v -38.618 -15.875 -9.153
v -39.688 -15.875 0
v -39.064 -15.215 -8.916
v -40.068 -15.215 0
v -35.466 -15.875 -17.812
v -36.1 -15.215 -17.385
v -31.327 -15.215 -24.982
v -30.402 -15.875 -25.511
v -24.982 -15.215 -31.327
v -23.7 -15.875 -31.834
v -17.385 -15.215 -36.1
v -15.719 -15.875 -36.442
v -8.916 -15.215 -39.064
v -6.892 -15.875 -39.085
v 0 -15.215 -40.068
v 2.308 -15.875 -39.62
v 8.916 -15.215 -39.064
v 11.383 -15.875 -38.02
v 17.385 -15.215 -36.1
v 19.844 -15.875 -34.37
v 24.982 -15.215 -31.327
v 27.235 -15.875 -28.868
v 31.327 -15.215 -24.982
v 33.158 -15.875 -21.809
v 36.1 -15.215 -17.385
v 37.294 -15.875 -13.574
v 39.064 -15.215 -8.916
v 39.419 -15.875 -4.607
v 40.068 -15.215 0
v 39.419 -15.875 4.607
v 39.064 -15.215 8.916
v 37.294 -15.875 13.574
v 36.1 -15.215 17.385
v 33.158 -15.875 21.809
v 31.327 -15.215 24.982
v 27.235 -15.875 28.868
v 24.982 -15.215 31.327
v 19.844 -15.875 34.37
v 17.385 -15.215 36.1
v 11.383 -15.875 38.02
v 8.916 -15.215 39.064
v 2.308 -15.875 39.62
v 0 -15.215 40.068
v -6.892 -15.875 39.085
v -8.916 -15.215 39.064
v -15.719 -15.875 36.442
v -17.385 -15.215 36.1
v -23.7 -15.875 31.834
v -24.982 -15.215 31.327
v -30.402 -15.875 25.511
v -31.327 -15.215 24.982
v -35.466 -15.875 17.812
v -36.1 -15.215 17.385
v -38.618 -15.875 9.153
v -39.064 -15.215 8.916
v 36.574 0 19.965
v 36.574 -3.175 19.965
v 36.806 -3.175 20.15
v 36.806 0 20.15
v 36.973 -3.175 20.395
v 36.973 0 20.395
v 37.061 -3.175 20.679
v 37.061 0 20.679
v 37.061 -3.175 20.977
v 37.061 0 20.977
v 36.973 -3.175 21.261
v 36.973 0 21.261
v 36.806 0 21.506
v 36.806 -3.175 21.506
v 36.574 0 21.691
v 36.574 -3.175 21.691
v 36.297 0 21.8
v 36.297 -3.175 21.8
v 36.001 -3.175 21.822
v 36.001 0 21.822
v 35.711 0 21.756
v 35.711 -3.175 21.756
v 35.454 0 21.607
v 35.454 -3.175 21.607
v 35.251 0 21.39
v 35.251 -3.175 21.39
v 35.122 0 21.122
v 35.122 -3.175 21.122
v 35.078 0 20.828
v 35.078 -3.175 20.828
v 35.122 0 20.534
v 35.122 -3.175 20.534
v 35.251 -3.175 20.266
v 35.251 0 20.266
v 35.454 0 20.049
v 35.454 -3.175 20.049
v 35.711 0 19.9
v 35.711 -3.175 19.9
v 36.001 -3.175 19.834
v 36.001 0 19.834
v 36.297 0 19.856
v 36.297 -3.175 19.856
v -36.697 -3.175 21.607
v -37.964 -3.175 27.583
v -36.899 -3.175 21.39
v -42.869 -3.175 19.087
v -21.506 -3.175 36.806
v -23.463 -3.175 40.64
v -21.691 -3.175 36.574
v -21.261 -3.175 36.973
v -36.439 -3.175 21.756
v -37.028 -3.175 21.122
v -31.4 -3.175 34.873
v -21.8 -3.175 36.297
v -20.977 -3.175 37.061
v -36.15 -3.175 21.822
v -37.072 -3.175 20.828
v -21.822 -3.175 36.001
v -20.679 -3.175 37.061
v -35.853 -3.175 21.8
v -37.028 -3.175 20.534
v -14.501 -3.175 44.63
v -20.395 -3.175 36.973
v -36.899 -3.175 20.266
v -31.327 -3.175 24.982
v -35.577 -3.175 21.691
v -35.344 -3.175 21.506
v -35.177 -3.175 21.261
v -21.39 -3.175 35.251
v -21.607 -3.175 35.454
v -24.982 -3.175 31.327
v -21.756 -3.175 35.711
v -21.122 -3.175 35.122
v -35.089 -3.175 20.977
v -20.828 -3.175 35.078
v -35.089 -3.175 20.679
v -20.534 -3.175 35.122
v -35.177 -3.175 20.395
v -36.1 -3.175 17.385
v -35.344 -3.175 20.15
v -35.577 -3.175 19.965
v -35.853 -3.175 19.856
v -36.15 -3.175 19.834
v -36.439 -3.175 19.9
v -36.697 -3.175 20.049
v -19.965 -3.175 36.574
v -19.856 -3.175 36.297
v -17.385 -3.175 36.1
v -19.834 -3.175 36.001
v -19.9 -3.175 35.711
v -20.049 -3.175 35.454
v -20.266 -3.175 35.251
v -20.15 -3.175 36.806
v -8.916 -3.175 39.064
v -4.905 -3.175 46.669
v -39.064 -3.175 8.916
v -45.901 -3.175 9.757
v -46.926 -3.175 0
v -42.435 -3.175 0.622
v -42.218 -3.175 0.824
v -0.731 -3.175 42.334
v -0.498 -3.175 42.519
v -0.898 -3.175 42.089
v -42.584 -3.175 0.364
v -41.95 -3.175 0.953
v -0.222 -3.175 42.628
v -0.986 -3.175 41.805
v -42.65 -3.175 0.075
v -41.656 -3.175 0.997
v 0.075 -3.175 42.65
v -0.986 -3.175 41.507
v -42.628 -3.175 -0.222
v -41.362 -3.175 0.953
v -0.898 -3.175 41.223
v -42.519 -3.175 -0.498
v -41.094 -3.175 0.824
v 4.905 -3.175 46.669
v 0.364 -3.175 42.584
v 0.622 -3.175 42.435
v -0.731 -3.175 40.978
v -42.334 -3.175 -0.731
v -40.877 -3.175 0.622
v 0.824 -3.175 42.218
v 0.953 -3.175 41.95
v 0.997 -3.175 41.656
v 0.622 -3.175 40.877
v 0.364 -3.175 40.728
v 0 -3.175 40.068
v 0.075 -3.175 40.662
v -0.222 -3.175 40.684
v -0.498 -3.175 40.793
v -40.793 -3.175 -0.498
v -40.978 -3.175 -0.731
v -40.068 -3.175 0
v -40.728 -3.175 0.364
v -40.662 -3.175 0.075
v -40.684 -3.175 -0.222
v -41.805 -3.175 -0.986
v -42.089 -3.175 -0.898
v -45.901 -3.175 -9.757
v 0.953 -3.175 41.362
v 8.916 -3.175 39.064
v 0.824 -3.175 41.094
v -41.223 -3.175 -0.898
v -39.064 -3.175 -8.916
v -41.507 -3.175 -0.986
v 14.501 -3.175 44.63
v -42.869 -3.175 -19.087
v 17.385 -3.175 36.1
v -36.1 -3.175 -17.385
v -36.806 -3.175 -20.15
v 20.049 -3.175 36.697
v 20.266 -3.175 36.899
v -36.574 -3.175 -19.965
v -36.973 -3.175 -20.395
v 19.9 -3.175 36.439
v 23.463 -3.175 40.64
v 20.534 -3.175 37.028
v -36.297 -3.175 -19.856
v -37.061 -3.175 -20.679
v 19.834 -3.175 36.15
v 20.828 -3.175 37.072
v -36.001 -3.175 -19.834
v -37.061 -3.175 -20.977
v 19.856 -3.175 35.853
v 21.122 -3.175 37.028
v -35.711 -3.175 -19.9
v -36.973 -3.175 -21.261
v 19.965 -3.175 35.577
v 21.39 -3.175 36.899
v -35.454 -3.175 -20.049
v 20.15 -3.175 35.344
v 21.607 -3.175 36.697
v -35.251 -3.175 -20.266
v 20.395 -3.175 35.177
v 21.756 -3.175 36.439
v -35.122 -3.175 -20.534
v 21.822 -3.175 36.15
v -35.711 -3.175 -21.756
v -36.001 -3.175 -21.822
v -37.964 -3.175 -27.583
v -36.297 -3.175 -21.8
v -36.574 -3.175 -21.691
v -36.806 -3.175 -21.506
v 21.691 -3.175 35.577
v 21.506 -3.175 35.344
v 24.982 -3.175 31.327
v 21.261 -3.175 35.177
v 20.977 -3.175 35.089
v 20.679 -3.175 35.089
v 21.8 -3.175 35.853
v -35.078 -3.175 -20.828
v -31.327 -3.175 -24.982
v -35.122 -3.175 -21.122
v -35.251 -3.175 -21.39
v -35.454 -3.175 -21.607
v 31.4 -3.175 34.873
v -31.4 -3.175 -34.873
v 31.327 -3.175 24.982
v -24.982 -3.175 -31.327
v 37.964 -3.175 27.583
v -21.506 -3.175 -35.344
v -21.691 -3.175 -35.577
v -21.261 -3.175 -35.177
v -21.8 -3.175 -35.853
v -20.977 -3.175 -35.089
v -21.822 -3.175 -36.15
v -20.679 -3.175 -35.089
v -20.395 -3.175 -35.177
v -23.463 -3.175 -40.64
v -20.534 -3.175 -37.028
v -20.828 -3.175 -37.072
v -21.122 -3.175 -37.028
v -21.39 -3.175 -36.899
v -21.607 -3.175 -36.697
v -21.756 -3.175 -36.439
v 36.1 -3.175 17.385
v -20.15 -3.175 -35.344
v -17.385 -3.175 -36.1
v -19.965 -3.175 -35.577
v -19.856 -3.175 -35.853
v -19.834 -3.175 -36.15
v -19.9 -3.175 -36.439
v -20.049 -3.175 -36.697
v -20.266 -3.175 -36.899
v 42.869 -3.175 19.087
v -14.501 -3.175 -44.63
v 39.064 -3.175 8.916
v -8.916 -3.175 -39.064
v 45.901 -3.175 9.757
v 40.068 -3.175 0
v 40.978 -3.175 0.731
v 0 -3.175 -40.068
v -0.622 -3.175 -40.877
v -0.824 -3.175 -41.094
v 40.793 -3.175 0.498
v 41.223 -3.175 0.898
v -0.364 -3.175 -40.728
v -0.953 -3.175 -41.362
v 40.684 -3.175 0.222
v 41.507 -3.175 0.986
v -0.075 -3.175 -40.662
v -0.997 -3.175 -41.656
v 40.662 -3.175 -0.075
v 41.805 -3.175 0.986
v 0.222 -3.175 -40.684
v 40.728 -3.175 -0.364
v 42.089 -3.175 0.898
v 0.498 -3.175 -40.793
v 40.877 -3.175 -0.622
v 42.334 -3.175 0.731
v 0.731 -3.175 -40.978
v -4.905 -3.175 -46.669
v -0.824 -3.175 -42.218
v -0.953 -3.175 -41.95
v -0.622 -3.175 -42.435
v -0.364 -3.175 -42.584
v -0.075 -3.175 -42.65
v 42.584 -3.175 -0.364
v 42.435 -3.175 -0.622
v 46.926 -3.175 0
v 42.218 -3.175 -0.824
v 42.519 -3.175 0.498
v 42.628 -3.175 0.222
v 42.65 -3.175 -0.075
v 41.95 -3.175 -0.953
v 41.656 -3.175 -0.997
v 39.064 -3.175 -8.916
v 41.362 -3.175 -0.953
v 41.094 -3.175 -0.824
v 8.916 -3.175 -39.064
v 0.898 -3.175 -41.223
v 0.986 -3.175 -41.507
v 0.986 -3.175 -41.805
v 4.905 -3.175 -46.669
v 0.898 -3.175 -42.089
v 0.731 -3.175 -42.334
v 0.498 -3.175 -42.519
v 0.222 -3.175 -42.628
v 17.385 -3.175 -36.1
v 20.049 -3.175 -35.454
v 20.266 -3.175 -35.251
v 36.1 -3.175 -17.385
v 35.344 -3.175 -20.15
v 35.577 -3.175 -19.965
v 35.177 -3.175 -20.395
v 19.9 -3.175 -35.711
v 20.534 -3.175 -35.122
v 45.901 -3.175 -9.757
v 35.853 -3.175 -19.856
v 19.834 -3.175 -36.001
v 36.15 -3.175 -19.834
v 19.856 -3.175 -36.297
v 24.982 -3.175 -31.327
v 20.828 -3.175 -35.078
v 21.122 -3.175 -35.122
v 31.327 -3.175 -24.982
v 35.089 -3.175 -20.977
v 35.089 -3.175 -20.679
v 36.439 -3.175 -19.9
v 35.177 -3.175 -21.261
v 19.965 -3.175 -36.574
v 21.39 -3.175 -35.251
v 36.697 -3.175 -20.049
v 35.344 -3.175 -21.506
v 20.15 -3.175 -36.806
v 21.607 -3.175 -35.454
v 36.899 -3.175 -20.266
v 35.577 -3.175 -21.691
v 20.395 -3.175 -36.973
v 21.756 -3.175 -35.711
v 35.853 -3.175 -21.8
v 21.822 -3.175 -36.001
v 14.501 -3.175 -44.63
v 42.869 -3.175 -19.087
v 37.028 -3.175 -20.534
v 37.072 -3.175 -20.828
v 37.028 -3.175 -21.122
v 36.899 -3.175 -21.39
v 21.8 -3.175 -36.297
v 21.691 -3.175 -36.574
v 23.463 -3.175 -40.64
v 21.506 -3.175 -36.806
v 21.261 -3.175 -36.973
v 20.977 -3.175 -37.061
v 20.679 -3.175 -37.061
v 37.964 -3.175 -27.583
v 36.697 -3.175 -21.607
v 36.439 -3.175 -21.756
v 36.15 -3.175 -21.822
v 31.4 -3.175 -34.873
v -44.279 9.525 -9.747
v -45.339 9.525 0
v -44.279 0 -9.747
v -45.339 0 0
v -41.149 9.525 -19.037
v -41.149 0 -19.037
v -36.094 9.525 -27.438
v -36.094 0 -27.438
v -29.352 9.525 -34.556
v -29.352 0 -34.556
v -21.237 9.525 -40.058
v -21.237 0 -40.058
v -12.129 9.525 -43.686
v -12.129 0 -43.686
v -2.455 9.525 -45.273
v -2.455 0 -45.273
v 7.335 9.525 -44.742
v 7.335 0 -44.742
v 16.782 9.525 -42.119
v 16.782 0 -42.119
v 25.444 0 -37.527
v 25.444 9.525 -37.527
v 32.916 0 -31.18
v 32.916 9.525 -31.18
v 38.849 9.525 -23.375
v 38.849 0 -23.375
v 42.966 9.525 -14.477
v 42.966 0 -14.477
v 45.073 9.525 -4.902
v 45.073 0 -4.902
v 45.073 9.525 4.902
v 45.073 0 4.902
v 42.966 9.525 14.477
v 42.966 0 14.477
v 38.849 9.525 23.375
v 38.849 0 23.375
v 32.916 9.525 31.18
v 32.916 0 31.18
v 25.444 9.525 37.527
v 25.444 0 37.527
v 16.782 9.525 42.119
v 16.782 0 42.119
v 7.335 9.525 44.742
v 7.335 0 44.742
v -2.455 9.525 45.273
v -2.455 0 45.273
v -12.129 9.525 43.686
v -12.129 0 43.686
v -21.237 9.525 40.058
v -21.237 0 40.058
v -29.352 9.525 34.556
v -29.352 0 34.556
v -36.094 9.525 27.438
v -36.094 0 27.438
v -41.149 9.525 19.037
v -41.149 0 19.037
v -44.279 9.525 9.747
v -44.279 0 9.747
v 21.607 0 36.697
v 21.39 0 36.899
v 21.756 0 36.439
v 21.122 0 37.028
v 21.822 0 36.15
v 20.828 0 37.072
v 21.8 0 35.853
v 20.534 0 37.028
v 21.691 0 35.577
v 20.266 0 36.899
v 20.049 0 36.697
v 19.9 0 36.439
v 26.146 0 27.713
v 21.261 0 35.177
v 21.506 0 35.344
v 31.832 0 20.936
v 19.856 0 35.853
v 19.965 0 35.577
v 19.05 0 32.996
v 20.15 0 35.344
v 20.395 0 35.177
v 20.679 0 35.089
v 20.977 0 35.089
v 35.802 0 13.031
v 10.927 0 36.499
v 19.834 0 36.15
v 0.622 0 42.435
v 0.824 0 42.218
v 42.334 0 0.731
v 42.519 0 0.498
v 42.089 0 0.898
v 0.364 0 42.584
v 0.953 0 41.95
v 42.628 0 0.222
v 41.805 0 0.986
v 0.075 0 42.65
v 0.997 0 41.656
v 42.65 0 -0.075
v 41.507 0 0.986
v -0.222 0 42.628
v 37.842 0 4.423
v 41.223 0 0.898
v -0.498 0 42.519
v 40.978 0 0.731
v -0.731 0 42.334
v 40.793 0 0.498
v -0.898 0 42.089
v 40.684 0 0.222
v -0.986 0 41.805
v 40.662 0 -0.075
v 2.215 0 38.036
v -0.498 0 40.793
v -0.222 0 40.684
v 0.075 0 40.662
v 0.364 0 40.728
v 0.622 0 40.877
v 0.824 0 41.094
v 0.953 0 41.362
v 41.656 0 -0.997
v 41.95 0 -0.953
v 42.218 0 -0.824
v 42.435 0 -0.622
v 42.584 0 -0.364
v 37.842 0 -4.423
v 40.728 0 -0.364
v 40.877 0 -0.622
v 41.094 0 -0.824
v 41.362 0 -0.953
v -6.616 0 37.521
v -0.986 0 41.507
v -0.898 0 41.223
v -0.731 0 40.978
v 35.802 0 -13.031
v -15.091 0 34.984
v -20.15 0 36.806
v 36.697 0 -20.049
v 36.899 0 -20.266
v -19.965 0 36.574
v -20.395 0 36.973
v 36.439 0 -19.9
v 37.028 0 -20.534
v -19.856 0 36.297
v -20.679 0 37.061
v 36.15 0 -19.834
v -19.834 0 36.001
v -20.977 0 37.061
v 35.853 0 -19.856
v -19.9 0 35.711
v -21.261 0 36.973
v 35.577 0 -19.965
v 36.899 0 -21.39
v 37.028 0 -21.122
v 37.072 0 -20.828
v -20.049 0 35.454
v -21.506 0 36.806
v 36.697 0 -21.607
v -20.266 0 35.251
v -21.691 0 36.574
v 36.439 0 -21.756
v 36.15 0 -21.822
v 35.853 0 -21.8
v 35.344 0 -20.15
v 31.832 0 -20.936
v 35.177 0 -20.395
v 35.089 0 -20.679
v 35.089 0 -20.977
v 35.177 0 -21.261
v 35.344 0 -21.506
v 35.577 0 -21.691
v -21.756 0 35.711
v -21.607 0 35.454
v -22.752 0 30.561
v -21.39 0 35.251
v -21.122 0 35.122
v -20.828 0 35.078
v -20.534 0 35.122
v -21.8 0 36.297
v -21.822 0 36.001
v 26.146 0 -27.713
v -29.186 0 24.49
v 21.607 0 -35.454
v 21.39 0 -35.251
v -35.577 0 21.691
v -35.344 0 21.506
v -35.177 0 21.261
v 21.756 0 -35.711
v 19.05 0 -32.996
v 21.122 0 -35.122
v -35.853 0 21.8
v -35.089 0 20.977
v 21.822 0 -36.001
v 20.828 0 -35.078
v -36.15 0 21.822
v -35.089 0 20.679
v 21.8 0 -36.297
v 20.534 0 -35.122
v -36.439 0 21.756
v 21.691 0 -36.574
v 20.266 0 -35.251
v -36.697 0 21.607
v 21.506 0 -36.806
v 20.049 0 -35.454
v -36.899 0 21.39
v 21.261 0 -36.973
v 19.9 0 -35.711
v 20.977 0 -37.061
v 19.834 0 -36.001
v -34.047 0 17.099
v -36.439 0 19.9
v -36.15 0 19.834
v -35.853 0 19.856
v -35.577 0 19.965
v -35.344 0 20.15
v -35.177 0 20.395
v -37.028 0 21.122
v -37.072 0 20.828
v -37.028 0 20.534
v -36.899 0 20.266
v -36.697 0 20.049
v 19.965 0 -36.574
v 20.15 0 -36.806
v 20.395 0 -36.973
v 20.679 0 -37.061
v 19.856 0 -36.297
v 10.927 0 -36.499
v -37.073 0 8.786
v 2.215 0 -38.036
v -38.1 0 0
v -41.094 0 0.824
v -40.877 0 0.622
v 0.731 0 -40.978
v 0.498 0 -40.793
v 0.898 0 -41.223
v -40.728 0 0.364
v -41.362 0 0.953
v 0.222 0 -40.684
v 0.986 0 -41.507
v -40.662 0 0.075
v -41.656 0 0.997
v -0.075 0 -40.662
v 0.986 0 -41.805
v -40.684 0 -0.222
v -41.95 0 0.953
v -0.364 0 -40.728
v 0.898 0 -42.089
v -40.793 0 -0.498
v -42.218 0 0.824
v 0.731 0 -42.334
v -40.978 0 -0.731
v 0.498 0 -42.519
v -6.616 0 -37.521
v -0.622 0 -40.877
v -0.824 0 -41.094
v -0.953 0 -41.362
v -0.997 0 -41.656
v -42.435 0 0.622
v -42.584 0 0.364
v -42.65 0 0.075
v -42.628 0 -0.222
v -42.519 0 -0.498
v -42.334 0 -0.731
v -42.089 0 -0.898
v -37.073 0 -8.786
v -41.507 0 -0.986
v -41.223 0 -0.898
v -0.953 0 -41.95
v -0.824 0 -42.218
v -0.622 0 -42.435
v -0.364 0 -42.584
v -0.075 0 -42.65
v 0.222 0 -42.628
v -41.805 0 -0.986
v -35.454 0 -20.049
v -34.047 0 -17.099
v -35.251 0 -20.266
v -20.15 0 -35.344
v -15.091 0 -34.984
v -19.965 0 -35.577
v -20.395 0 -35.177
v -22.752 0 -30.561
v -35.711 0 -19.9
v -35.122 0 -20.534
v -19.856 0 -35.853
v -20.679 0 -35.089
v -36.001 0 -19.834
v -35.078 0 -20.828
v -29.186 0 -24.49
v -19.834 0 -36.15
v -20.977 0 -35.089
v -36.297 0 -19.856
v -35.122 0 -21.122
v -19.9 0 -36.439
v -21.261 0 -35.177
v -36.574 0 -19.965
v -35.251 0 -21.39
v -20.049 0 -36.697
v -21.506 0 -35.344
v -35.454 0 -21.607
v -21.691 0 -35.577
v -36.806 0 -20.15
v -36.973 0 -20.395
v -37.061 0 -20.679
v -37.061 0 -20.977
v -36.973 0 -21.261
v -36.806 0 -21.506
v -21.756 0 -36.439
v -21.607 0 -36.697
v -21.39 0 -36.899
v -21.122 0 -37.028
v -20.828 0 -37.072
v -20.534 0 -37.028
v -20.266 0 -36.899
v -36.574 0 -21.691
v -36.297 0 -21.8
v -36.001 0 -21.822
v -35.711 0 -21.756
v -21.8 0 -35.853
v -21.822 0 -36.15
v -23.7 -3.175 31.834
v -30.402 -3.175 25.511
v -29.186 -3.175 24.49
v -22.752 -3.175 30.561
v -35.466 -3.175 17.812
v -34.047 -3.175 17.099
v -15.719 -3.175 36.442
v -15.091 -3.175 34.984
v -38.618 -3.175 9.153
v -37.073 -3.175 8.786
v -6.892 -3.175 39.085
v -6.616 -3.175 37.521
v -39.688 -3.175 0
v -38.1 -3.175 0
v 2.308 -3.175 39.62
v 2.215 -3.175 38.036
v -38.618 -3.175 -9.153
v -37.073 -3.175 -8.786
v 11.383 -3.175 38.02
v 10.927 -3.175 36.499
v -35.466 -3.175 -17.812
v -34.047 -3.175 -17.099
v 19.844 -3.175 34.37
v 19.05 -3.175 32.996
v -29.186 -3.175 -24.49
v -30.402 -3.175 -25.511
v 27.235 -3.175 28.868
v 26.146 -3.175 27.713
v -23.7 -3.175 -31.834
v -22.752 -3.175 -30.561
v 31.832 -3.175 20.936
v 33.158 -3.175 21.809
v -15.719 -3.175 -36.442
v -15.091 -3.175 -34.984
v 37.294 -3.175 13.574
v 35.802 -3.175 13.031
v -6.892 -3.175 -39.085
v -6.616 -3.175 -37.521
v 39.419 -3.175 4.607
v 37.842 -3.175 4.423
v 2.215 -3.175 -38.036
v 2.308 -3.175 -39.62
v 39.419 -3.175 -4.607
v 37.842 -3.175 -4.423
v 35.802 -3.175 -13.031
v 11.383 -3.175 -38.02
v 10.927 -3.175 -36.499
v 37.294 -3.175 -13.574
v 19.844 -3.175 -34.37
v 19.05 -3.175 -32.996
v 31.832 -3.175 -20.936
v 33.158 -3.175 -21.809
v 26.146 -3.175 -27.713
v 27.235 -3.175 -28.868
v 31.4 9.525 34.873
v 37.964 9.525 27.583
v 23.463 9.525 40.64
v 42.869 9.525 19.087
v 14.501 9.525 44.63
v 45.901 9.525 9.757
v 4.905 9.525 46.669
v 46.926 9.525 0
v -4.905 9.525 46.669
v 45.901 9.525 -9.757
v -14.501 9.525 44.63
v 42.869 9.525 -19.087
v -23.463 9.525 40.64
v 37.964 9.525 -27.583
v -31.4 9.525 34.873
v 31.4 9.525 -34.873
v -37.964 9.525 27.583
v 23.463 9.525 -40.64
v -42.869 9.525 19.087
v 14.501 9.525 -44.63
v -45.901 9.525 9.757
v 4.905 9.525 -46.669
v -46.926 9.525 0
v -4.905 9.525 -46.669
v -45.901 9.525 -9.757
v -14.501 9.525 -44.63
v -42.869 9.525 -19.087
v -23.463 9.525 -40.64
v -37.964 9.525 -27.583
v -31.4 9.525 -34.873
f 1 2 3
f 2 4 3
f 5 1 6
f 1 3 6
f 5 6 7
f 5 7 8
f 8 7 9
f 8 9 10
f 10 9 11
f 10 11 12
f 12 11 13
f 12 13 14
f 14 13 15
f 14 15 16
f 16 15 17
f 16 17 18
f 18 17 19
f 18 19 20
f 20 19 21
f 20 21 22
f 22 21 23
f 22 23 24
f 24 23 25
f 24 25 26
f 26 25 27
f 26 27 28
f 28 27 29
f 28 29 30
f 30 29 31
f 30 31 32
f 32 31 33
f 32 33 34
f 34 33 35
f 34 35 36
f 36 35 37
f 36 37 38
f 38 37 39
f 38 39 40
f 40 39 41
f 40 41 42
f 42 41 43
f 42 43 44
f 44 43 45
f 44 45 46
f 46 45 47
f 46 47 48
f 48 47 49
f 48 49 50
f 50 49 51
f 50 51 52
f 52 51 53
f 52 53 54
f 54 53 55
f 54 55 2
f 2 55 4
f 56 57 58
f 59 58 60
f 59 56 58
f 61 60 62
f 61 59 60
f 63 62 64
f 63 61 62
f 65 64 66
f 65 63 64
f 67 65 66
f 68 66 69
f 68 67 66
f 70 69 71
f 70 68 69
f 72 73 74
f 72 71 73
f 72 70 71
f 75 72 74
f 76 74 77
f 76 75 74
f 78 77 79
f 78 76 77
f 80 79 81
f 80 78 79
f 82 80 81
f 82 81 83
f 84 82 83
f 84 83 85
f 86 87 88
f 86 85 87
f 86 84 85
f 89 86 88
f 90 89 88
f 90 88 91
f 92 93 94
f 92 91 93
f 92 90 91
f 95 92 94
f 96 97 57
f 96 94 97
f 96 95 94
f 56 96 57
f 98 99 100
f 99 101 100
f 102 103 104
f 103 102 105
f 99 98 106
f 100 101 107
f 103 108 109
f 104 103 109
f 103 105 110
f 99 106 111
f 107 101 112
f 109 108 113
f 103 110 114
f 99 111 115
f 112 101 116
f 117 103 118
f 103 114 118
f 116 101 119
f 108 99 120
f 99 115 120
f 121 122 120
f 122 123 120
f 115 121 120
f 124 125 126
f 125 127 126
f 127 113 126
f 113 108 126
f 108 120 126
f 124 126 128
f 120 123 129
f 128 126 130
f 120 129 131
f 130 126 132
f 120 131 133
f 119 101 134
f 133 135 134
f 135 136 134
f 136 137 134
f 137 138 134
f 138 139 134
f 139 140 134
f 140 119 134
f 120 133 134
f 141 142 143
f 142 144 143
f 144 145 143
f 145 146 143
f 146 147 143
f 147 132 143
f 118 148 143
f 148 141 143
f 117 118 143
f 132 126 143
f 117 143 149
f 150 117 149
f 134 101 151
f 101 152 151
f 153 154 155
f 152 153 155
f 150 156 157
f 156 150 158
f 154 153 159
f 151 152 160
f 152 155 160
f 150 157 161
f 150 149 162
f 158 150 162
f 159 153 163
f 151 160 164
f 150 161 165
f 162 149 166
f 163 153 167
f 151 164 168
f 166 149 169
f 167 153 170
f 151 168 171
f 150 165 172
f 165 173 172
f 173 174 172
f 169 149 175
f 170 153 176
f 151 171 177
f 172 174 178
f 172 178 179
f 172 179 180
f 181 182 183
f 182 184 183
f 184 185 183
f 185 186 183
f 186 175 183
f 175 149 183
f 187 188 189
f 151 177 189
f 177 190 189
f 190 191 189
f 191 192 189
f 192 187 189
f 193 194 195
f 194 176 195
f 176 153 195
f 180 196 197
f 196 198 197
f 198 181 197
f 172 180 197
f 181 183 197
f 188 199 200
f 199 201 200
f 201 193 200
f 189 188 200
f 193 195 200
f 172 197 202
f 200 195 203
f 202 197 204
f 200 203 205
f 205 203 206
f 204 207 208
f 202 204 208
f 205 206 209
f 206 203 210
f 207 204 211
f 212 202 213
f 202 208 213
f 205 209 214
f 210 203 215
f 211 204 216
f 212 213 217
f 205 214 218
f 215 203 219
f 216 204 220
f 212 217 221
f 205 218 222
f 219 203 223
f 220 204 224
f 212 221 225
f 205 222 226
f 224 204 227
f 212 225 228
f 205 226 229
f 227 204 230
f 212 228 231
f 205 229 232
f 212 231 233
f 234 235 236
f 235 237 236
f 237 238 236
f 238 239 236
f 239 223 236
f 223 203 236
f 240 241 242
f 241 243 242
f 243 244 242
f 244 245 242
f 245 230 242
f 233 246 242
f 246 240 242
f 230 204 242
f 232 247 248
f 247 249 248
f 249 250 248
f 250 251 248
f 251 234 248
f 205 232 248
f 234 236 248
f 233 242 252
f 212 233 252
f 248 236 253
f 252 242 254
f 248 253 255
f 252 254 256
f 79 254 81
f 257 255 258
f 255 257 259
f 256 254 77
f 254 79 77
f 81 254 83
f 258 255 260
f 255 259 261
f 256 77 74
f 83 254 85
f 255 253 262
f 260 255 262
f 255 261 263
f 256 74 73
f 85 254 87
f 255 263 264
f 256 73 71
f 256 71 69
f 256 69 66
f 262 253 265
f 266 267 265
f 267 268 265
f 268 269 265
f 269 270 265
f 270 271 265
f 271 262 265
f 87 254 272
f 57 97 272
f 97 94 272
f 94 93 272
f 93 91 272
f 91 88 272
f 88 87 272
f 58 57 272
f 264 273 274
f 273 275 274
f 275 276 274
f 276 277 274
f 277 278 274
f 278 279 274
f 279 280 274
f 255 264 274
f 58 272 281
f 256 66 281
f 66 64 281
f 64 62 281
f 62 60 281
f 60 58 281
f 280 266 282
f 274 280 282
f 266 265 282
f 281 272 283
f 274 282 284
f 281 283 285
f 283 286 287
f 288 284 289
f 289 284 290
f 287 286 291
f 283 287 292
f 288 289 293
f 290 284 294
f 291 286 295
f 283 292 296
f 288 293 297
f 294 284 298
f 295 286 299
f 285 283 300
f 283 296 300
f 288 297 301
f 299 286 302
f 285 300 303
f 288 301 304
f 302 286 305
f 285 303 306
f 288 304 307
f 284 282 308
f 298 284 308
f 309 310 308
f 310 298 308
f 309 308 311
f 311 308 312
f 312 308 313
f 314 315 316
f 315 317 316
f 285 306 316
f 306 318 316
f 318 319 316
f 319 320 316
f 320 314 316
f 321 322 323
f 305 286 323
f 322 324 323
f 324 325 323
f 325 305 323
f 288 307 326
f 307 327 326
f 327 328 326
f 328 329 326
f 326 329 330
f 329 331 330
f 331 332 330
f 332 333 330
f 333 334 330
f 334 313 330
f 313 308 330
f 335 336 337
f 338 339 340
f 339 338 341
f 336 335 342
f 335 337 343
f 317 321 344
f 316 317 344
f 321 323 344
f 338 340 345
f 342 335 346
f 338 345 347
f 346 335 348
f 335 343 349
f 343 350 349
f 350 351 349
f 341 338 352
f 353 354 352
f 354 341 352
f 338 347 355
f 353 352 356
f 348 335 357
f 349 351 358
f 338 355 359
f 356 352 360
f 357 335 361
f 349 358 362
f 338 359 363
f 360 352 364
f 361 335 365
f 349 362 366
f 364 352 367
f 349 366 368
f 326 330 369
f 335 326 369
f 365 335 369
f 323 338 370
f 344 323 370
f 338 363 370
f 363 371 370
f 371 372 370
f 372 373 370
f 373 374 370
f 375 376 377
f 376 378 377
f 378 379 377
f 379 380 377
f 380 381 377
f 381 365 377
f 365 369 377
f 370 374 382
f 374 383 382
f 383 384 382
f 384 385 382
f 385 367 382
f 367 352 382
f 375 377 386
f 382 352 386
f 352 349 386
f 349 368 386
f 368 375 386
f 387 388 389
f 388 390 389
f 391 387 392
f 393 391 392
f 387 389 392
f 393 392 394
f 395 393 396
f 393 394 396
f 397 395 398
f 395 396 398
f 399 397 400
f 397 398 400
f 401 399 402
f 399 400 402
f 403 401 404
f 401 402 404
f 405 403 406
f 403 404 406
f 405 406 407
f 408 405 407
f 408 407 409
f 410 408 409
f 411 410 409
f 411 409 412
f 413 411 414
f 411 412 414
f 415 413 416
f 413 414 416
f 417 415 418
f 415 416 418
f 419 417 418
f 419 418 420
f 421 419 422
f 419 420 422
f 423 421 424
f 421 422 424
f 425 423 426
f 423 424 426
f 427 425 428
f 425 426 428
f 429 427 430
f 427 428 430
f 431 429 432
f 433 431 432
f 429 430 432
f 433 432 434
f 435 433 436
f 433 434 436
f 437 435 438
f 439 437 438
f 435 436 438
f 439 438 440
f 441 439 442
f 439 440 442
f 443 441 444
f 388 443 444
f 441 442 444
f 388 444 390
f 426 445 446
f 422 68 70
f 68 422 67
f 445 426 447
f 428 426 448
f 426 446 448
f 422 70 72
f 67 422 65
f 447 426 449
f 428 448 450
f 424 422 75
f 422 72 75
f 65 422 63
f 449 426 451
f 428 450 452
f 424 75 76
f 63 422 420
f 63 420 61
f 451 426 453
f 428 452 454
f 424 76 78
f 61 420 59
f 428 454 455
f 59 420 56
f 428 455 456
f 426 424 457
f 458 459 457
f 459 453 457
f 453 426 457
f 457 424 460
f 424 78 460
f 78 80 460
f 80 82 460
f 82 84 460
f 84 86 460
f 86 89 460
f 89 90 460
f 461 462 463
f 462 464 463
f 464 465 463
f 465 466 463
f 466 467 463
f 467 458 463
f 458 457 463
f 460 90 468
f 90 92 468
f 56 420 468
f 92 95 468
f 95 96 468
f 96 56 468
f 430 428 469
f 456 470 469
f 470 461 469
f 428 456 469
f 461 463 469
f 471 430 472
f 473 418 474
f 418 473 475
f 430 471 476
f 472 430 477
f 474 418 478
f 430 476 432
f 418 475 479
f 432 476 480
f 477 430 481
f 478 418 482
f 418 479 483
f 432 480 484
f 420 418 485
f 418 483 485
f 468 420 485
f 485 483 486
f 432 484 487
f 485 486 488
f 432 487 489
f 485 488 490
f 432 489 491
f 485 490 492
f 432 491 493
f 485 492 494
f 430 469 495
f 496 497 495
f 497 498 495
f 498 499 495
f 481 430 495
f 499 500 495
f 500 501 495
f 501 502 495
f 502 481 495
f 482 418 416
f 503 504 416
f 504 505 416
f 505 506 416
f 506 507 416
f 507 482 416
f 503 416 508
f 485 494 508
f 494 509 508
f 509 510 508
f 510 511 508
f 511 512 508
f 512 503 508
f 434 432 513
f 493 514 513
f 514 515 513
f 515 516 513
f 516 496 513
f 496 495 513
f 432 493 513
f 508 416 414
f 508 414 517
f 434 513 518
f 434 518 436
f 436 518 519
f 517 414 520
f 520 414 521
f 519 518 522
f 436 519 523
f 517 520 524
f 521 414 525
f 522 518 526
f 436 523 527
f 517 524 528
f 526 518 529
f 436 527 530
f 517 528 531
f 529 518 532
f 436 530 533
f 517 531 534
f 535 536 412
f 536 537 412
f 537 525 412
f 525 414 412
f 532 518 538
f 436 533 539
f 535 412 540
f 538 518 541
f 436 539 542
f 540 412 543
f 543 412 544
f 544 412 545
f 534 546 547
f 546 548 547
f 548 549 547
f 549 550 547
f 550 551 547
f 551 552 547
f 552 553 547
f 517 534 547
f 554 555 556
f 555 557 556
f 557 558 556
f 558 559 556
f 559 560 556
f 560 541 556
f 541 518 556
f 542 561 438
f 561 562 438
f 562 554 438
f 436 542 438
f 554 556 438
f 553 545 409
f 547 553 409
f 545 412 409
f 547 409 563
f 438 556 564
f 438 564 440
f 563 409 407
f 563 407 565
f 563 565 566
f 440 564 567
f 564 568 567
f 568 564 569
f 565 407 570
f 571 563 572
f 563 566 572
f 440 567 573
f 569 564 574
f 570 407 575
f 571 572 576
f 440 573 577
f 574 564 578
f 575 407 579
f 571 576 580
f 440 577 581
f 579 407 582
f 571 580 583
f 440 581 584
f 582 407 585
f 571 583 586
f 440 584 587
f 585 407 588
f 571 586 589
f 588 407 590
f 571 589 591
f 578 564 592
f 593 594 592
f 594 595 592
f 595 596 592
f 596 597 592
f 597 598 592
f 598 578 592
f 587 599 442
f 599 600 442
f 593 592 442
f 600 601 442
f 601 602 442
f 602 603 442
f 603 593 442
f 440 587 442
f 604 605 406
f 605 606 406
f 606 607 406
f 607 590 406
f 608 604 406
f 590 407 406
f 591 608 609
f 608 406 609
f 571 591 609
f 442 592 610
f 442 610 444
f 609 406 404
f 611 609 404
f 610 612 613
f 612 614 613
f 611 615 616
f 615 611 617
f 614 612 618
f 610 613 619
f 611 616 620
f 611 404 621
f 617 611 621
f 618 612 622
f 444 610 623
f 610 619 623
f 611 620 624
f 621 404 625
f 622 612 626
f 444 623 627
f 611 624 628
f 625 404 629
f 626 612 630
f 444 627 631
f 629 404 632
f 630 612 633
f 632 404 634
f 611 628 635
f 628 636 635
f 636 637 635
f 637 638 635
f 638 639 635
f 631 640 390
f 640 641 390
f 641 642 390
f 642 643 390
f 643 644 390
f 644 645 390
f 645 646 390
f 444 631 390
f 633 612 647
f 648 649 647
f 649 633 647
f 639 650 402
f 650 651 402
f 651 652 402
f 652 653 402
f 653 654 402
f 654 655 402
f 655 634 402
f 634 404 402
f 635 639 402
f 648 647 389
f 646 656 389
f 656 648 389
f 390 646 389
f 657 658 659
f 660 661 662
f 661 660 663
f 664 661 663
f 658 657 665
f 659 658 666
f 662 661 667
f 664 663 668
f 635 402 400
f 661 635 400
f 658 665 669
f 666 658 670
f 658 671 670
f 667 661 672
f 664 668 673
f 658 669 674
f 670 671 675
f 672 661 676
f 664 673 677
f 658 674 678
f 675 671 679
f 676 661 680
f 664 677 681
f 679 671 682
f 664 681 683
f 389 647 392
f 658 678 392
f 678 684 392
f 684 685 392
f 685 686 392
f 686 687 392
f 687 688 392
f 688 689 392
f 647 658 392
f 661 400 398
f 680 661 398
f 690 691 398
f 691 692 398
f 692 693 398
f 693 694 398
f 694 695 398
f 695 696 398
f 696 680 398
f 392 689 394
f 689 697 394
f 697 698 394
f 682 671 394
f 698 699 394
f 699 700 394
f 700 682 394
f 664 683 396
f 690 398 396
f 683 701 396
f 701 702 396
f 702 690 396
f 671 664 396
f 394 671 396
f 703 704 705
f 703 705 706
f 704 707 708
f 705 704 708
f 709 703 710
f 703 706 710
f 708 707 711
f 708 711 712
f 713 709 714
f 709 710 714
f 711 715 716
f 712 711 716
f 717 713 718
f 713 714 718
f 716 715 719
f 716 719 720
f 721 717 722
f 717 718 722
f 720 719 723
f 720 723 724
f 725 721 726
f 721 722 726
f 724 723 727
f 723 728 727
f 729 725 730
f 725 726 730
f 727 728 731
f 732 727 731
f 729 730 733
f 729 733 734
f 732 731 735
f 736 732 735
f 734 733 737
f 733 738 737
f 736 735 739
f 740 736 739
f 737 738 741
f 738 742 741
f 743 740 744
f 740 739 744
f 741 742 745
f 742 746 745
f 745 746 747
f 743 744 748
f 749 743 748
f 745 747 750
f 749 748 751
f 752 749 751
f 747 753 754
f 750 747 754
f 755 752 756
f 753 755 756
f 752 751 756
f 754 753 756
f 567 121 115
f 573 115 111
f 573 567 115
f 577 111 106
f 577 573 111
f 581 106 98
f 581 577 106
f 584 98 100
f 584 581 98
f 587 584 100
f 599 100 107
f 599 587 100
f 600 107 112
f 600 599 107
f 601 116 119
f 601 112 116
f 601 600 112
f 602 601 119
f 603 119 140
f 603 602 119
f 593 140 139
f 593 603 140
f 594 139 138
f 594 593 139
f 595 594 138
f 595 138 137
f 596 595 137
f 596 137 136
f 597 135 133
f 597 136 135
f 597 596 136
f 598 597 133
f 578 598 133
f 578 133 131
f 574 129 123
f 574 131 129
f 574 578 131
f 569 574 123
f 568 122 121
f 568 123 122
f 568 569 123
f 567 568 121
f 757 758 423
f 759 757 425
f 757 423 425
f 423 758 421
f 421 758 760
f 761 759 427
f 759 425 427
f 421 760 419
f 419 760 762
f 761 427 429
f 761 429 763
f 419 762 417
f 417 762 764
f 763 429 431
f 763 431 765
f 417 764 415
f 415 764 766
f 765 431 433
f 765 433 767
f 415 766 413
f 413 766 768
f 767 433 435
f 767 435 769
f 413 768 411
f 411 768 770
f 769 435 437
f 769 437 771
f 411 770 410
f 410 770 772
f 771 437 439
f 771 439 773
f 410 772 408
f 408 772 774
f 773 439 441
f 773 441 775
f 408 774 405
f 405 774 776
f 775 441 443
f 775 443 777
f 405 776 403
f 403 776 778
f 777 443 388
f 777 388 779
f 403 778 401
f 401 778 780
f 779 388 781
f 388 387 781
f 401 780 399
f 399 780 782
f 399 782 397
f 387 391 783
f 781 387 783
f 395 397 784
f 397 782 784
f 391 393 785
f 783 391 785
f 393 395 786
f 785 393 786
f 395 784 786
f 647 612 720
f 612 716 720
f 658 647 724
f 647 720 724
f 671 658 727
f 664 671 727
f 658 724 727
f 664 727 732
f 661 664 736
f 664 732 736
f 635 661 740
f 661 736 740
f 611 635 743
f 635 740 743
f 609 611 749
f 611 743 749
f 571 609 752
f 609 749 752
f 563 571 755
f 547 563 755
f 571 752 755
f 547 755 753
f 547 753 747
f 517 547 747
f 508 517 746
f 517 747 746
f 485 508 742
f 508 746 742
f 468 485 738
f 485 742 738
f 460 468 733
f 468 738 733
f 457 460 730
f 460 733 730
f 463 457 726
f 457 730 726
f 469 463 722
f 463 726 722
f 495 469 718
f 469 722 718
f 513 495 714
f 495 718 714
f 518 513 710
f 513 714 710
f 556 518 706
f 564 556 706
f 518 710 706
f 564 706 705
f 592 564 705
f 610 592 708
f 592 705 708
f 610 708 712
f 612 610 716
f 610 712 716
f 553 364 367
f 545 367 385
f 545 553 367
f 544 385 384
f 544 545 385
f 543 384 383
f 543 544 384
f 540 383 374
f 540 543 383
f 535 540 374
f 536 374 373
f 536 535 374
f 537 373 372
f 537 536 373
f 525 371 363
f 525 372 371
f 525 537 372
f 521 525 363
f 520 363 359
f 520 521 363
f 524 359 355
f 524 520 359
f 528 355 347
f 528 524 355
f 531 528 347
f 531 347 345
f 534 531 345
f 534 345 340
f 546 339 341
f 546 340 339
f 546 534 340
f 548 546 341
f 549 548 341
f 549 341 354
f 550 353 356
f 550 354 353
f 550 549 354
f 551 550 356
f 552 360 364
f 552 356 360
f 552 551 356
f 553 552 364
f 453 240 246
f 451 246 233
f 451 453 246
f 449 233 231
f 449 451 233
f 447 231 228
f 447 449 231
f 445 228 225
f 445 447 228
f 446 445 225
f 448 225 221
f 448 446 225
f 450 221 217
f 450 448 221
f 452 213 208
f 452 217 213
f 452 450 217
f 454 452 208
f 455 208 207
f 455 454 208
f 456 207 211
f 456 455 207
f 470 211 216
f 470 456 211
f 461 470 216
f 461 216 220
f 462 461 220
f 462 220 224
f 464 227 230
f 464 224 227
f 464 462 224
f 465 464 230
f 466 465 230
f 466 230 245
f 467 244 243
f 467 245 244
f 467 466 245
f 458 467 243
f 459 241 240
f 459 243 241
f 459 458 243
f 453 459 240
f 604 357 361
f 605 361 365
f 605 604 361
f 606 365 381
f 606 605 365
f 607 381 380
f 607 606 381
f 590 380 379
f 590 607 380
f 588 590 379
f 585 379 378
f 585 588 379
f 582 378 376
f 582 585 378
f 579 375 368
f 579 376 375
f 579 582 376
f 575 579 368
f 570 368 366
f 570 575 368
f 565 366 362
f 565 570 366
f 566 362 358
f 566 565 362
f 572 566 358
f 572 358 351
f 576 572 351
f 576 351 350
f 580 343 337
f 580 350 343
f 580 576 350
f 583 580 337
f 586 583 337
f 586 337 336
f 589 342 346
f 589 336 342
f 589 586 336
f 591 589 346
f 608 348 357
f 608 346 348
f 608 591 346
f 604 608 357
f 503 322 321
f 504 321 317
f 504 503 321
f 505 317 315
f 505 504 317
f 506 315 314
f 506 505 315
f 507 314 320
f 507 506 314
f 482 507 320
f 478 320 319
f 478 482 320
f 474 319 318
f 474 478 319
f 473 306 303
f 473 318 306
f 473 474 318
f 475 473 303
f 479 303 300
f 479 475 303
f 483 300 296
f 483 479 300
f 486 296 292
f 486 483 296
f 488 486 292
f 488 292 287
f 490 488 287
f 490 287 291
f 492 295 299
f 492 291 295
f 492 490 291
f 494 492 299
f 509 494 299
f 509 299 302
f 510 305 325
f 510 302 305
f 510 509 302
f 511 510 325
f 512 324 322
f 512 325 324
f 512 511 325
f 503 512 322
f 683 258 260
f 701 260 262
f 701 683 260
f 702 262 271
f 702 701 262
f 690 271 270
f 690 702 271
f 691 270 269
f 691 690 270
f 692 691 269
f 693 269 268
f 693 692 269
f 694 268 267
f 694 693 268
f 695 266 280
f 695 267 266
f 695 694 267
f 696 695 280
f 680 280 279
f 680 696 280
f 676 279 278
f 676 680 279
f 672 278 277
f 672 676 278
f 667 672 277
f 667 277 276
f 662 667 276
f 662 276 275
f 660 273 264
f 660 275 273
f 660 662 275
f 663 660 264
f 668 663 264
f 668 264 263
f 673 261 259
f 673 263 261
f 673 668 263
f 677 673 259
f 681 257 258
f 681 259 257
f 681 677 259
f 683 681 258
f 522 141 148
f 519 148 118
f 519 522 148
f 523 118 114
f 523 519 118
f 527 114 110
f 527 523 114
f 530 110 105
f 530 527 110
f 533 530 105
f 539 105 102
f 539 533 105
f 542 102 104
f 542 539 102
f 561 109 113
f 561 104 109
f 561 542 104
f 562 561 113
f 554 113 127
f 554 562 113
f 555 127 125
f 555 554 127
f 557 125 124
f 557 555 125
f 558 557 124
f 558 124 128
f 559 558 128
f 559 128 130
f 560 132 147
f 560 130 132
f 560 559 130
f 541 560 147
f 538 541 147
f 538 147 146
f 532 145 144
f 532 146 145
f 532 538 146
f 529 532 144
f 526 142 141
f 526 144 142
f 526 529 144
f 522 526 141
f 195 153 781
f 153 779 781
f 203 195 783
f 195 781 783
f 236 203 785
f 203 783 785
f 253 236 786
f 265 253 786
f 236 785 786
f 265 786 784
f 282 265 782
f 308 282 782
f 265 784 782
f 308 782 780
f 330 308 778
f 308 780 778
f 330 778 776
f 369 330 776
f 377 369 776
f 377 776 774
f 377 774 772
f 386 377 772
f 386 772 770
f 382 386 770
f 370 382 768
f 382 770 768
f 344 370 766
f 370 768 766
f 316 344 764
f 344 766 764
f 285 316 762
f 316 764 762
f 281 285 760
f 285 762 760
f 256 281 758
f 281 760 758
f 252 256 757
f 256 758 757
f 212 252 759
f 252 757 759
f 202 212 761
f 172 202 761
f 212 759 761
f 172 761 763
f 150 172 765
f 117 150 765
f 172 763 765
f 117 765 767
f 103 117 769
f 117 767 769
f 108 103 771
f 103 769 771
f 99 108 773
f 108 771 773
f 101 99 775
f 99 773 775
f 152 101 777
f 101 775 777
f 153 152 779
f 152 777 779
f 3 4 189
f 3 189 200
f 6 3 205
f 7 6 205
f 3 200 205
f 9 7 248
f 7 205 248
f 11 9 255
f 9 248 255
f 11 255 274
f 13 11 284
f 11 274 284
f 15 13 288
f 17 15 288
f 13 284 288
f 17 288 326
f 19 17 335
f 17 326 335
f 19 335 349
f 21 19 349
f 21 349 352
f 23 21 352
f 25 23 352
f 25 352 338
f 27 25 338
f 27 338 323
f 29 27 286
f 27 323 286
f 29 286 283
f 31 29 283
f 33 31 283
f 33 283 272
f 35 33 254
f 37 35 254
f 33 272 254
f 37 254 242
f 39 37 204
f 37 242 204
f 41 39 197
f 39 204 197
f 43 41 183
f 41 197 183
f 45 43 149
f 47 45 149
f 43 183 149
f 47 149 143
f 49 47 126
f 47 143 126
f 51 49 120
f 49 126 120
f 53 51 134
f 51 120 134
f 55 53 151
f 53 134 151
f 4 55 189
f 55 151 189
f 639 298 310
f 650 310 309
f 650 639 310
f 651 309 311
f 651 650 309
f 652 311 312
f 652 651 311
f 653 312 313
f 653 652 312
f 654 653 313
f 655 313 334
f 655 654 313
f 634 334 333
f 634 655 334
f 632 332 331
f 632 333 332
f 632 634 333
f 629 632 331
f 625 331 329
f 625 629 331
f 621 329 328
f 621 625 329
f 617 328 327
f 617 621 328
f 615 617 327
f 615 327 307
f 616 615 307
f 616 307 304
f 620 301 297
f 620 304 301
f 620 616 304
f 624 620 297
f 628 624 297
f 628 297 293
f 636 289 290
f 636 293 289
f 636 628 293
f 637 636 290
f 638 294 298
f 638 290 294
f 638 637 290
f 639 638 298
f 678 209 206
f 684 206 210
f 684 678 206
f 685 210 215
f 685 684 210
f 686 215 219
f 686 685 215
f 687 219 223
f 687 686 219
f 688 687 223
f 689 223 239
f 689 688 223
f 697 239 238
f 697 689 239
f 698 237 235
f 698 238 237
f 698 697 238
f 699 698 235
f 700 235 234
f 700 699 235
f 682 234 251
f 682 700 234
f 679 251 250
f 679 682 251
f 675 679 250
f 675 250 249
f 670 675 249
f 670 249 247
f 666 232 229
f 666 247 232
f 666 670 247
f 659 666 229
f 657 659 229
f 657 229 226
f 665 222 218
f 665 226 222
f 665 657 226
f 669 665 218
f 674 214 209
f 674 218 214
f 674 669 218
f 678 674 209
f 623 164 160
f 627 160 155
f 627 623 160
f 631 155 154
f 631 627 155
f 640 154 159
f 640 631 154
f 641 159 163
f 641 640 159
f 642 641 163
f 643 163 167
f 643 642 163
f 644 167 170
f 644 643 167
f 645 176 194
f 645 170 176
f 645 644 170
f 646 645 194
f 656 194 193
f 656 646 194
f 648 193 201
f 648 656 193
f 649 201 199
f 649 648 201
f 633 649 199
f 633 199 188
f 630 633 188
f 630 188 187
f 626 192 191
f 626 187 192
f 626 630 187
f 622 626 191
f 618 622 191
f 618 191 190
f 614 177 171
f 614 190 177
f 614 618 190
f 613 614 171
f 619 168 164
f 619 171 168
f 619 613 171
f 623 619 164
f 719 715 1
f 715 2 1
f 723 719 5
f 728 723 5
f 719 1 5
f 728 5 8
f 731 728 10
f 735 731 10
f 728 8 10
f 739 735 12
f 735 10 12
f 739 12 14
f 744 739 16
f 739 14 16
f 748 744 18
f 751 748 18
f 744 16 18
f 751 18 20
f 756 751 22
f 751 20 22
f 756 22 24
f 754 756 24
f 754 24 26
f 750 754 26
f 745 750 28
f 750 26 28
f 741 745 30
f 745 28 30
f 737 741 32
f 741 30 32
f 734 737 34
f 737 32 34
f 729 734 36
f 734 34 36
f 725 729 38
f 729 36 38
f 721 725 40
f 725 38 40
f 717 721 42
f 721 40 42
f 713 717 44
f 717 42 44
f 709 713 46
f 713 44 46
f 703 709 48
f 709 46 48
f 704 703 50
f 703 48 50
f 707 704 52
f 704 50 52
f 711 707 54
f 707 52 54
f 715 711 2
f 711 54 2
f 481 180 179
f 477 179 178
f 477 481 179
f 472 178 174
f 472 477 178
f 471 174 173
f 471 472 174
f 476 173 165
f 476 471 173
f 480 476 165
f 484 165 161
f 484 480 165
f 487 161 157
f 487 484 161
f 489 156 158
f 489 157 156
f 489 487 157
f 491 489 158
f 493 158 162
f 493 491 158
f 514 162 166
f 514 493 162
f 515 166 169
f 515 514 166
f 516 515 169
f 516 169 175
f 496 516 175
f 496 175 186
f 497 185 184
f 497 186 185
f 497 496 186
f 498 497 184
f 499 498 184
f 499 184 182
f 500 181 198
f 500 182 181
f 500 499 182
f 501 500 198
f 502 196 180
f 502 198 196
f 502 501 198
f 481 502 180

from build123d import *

# Parameters (mm, degrees)
SCREW_HOLES_COUNT = 12


with BuildPart() as part:
    # Cross Section → Main (revolve)
    with BuildSketch(Plane.XY):
        Polygon((-38.1, 0), (-38.1, -3.175), (-39.6875, -3.175), (-39.6875, -15.875), (-40.0685, -15.215088642), (-40.0685, -3.175), (-46.9265, -3.175), (-46.9265, 9.525), (-45.339, 9.525), (-45.339, 0), align=None)
    revolve(axis=Axis((0, 55, 0), (0, -1, 0)))

    # Sketch7 → #3-48 Tapped Hole1 (revolve, cut)
    with BuildSketch(Plane(origin=(-41.656, 0, 0), x_dir=(0, 0, 1), z_dir=(1, 0, 0))):
        Polygon((0, 0), (0, 3.901027994), (0.99695, 3.302), (0.99695, 0), align=None)
    f_3_48_tapped_hole1 = revolve(axis=Axis((-41.656, 6.35, 0), (0, -1, 0)), mode=Mode.SUBTRACT)

    # Screw Holes: #3-48 Tapped Hole1 ×12 about axis
    screw_holes_axis = Axis((0, 0, 0), (0, 1, 0))
    for i in range(1, SCREW_HOLES_COUNT):
        add(f_3_48_tapped_hole1.rotate(screw_holes_axis, i * 360 / SCREW_HOLES_COUNT), mode=Mode.SUBTRACT)


solid = part.part
